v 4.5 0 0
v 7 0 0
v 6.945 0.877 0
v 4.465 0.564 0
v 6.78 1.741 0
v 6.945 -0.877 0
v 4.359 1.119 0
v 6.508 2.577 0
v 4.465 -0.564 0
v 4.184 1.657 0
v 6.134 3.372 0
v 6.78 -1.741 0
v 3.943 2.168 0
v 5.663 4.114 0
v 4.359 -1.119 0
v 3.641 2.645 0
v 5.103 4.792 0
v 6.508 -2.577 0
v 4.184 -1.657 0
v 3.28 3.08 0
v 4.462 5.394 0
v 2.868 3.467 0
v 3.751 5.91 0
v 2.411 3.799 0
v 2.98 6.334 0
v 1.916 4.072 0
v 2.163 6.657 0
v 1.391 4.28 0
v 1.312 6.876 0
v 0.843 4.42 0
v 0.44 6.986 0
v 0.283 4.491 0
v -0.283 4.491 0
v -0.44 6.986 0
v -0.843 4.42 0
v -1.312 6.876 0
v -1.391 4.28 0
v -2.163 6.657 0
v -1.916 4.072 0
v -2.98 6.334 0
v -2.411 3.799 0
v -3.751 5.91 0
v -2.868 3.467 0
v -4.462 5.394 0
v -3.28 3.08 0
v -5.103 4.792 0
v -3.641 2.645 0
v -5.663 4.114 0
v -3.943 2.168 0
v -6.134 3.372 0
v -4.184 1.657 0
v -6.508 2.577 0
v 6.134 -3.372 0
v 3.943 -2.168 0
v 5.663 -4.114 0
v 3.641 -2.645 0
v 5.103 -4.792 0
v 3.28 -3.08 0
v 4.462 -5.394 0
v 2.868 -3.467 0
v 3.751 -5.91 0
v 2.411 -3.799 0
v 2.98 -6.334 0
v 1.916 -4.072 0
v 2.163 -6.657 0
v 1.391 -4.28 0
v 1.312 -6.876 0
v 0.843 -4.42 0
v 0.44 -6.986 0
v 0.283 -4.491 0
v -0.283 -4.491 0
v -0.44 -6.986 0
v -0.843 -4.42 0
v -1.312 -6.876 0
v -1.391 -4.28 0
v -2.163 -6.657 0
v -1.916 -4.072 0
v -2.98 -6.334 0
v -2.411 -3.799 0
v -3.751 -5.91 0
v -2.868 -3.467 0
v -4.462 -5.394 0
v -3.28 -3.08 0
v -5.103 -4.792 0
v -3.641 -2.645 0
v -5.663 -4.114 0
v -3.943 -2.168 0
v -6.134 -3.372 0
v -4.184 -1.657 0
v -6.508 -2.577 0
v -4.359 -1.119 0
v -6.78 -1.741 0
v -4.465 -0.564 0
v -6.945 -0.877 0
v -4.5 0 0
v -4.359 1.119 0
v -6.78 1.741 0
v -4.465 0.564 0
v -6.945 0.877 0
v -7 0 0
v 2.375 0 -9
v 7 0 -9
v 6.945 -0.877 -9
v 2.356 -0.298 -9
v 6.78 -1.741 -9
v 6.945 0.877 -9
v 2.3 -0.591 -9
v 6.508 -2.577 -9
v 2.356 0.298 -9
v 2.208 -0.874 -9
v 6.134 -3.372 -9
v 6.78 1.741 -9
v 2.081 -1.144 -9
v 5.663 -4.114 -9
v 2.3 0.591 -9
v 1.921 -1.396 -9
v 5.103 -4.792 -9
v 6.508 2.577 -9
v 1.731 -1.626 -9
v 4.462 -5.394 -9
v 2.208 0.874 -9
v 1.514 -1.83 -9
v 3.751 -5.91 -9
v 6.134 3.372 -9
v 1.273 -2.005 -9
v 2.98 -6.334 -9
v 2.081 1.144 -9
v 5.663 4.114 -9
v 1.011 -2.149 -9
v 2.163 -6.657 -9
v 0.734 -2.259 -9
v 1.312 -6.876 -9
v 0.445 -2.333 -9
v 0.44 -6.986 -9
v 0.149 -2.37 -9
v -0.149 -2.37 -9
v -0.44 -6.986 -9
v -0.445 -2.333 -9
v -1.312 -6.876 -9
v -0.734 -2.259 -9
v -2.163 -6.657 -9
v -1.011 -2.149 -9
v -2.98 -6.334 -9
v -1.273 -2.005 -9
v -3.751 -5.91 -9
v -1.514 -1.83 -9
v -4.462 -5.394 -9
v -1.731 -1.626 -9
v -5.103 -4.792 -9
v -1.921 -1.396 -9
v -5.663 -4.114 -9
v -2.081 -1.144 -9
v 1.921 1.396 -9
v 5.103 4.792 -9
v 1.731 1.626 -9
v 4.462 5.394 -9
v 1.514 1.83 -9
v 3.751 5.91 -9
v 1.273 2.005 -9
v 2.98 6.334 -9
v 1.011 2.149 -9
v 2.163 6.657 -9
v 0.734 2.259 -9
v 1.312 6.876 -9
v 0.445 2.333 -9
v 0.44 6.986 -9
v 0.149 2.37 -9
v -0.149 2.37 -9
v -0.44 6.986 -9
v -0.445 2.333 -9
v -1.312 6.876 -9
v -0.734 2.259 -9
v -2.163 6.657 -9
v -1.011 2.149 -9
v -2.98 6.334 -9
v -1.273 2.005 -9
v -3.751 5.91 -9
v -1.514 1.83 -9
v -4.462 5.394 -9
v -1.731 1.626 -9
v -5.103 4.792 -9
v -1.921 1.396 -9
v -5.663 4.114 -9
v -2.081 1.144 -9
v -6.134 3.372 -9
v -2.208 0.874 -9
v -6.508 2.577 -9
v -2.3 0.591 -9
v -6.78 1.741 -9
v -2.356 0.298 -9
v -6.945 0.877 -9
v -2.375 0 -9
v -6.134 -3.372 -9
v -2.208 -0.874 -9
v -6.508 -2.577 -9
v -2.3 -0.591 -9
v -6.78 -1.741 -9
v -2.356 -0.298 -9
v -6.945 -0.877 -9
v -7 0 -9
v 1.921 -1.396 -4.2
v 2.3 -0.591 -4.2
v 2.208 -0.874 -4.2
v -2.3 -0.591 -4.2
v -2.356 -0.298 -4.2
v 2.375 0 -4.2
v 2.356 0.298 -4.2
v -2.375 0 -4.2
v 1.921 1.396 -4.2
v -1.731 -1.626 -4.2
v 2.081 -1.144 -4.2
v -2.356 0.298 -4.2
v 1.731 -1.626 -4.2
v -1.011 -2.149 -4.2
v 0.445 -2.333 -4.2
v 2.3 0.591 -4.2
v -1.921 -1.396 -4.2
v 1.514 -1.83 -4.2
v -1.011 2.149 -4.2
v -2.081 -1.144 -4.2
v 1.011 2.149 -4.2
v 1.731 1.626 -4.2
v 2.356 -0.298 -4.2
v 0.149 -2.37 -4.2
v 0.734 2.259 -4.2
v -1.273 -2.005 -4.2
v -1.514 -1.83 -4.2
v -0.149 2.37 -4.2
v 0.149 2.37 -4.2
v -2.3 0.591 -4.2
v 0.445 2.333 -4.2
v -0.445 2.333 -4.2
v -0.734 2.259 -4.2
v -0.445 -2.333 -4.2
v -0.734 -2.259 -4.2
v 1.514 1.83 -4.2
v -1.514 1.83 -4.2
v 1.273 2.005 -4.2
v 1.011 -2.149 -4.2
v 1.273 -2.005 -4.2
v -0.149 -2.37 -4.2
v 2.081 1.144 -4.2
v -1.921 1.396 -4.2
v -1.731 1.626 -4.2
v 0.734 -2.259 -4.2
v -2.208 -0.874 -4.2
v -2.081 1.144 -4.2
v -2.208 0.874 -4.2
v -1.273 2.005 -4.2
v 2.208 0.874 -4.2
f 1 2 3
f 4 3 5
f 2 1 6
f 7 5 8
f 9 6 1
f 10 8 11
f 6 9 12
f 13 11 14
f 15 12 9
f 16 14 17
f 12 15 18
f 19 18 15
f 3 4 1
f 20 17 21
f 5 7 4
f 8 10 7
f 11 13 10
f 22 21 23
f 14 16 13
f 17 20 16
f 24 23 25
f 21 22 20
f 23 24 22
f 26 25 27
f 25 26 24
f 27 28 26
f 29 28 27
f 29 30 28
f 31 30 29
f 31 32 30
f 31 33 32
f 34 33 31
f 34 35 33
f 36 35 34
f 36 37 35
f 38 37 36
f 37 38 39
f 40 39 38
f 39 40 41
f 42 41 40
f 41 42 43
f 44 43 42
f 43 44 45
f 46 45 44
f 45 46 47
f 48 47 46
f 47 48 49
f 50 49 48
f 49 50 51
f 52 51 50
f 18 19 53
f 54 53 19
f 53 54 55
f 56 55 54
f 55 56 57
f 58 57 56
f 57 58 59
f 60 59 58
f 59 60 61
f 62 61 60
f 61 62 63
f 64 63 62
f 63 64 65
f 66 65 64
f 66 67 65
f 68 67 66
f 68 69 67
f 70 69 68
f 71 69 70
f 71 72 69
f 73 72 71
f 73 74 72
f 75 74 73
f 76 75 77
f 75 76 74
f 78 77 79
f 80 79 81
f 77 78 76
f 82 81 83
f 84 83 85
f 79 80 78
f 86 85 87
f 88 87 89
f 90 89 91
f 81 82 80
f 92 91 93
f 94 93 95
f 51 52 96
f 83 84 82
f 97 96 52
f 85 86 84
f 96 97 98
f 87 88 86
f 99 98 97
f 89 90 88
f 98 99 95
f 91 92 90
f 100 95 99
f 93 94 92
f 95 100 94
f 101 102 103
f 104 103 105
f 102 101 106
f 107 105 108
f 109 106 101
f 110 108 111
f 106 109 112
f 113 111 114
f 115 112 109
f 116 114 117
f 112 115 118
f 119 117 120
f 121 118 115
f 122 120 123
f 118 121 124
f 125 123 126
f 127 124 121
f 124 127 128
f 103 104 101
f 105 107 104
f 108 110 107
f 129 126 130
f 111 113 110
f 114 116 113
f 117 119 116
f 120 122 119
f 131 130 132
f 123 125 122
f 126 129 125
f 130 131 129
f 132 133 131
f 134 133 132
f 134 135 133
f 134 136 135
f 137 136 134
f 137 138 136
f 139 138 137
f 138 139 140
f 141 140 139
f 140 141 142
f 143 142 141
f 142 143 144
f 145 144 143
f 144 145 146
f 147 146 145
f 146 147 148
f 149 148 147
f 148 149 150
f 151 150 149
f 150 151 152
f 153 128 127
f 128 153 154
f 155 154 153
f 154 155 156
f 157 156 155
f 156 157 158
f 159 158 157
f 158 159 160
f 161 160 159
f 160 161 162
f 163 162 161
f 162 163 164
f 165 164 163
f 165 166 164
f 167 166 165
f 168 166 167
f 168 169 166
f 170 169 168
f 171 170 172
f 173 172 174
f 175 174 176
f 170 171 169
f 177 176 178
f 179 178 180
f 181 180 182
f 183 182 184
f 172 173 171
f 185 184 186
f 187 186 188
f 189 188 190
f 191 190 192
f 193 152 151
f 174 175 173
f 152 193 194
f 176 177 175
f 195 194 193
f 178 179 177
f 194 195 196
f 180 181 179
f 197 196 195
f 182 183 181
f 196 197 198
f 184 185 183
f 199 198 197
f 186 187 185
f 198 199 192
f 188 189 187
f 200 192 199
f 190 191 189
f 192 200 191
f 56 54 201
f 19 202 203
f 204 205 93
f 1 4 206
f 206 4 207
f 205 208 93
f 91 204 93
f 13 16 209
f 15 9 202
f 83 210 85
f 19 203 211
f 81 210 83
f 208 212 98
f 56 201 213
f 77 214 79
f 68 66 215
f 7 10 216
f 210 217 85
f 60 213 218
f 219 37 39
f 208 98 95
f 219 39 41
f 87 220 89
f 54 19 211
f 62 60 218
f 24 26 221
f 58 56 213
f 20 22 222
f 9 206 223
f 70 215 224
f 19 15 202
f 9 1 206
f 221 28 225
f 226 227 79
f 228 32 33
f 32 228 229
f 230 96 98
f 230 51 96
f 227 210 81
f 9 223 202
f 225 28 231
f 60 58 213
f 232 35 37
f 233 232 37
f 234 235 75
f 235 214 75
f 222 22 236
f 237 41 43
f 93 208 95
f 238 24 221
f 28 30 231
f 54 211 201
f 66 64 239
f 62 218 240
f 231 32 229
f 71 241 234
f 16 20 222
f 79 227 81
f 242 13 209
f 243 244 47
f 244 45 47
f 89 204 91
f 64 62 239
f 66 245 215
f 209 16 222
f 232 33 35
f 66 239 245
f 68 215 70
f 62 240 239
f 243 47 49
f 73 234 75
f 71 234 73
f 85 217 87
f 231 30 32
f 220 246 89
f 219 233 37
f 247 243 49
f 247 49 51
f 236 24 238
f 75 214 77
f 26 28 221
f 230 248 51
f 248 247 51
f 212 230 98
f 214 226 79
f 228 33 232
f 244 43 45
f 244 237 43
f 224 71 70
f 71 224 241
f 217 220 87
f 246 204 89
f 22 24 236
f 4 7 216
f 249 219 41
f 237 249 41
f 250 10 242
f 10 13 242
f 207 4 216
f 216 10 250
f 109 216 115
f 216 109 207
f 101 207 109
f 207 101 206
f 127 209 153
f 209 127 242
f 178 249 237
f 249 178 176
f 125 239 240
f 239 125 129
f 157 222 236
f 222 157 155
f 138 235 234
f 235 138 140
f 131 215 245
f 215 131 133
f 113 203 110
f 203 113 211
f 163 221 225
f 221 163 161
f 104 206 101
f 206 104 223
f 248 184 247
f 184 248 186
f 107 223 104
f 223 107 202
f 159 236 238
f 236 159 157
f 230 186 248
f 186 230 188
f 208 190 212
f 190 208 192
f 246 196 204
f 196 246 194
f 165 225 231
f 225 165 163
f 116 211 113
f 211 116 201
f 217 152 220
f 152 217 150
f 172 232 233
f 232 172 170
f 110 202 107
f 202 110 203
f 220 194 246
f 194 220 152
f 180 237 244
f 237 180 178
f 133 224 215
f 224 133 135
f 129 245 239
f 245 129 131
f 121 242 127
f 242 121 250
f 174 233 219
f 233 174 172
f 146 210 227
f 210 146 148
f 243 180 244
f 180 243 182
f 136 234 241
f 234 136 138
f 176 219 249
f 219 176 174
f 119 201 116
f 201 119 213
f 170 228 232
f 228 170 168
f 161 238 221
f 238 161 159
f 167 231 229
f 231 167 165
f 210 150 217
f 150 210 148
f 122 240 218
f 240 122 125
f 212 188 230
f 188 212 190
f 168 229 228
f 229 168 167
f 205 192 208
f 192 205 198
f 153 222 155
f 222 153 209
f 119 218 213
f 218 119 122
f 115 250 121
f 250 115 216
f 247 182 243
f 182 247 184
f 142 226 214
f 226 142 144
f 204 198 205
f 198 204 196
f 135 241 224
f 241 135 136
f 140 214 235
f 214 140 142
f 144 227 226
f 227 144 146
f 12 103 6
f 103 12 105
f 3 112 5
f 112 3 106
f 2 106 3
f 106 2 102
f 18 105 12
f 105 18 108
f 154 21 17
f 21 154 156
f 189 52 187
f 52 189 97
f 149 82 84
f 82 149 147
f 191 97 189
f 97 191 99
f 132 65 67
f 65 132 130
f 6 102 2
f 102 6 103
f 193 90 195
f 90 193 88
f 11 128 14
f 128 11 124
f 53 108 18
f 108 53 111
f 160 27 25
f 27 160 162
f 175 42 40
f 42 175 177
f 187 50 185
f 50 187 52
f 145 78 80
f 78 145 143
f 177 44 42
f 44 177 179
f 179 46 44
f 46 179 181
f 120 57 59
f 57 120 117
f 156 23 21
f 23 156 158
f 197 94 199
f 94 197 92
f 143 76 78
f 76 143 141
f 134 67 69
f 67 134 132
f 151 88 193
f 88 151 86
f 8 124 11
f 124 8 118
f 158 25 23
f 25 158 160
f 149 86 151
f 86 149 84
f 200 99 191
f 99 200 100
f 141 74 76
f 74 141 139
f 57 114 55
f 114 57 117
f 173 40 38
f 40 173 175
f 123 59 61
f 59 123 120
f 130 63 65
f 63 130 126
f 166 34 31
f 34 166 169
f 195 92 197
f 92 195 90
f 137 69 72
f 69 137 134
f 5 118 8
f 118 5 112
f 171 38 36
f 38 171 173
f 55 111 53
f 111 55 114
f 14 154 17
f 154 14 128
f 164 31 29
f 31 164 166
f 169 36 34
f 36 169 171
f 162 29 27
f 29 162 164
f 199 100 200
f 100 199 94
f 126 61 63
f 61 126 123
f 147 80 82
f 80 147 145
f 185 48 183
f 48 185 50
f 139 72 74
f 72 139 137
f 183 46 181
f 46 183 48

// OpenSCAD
$fn = 50;


difference() {
	union() {
		translate(v = [0, 0, -9.0000000000]) {
			cylinder(h = 9, r = 7.0000000000);
		}
		cylinder(h = 0, r = 13.0000000000);
	}
	union() {
		translate(v = [0, 0, 0]) {
			rotate(a = [0, 0, 0]) {
				difference() {
					union() {
						#translate(v = [0, 0, -9.0000000000]) {
							cylinder(h = 9, r = 2.2500000000);
						}
						#translate(v = [0, 0, -4.2000000000]) {
							cylinder(h = 4.2000000000, r1 = 2.3750000000, r2 = 4.5000000000);
						}
						#translate(v = [0, 0, -9.0000000000]) {
							cylinder(h = 9, r = 2.3750000000);
						}
						#translate(v = [0, 0, -9.0000000000]) {
							cylinder(h = 9, r = 2.2500000000);
						}
					}
					union();
				}
			}
		}
	}
}
